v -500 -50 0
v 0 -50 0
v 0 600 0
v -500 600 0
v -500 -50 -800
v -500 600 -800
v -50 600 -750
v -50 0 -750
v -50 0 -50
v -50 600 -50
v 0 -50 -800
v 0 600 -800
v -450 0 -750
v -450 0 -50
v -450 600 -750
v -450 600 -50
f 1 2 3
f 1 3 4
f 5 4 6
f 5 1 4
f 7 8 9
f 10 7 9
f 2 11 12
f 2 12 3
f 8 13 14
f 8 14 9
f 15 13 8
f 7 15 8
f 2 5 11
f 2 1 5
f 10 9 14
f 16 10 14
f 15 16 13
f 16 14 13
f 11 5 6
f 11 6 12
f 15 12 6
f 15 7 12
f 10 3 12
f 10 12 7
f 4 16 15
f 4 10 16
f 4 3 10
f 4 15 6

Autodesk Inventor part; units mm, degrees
ref_plane "YZ Plane" through (0, 0, 0) normal (1, 0, 0) x (0, 1, 0)
ref_plane "XZ Plane" through (0, 0, 0) normal (0, 1, 0) x (-1, 0, 0)
ref_plane "XY Plane" through (0, 0, 0) normal (0, 0, 1) x (1, 0, 0)
sketch "Boceto1" plane through (0, 0, 0) normal (0, 1, 0) x (-1, 0, 0)
  line L0 (0, 0) -> (500, 0)
  line L1 (500, 0) -> (500, -800)
  line L2 (500, -800) -> (0, -800)
  line L3 (0, -800) -> (0, 0)
  line L4 (0, 0) -> (50, 0)
  line L5 (0, -50) -> (0, 0)
  line L6 (500, -800) -> (450, -800)
  line L7 (500, -750) -> (500, -800)
  line L8 (50, -50) -> (450, -50)
  line L9 (450, -50) -> (450, -750)
  line L10 (450, -750) -> (50, -750)
  line L11 (50, -750) -> (50, -50)
  dimension "d0" = 800
  dimension "d1" = 500
  dimension "d2" = 50
  dimension "d3" = 50
extrude "Extrusión1" add sketch "Boceto1" along normal blind 600
sketch "Boceto2" plane through (0, 0, 0) normal (0, -1, 0) x (1, 0, 0)
  line L0 (0, -800) -> (-500, -800) projected
  line L1 (-500, -800) -> (0, -800)
  line L2 (0, -800) -> (0, 0)
  line L3 (0, 0) -> (-500, 0)
  line L4 (-500, 0) -> (-500, -800)
extrude "Extrusión2" add sketch "Boceto2" along normal blind 50
properties part number "Caja"
